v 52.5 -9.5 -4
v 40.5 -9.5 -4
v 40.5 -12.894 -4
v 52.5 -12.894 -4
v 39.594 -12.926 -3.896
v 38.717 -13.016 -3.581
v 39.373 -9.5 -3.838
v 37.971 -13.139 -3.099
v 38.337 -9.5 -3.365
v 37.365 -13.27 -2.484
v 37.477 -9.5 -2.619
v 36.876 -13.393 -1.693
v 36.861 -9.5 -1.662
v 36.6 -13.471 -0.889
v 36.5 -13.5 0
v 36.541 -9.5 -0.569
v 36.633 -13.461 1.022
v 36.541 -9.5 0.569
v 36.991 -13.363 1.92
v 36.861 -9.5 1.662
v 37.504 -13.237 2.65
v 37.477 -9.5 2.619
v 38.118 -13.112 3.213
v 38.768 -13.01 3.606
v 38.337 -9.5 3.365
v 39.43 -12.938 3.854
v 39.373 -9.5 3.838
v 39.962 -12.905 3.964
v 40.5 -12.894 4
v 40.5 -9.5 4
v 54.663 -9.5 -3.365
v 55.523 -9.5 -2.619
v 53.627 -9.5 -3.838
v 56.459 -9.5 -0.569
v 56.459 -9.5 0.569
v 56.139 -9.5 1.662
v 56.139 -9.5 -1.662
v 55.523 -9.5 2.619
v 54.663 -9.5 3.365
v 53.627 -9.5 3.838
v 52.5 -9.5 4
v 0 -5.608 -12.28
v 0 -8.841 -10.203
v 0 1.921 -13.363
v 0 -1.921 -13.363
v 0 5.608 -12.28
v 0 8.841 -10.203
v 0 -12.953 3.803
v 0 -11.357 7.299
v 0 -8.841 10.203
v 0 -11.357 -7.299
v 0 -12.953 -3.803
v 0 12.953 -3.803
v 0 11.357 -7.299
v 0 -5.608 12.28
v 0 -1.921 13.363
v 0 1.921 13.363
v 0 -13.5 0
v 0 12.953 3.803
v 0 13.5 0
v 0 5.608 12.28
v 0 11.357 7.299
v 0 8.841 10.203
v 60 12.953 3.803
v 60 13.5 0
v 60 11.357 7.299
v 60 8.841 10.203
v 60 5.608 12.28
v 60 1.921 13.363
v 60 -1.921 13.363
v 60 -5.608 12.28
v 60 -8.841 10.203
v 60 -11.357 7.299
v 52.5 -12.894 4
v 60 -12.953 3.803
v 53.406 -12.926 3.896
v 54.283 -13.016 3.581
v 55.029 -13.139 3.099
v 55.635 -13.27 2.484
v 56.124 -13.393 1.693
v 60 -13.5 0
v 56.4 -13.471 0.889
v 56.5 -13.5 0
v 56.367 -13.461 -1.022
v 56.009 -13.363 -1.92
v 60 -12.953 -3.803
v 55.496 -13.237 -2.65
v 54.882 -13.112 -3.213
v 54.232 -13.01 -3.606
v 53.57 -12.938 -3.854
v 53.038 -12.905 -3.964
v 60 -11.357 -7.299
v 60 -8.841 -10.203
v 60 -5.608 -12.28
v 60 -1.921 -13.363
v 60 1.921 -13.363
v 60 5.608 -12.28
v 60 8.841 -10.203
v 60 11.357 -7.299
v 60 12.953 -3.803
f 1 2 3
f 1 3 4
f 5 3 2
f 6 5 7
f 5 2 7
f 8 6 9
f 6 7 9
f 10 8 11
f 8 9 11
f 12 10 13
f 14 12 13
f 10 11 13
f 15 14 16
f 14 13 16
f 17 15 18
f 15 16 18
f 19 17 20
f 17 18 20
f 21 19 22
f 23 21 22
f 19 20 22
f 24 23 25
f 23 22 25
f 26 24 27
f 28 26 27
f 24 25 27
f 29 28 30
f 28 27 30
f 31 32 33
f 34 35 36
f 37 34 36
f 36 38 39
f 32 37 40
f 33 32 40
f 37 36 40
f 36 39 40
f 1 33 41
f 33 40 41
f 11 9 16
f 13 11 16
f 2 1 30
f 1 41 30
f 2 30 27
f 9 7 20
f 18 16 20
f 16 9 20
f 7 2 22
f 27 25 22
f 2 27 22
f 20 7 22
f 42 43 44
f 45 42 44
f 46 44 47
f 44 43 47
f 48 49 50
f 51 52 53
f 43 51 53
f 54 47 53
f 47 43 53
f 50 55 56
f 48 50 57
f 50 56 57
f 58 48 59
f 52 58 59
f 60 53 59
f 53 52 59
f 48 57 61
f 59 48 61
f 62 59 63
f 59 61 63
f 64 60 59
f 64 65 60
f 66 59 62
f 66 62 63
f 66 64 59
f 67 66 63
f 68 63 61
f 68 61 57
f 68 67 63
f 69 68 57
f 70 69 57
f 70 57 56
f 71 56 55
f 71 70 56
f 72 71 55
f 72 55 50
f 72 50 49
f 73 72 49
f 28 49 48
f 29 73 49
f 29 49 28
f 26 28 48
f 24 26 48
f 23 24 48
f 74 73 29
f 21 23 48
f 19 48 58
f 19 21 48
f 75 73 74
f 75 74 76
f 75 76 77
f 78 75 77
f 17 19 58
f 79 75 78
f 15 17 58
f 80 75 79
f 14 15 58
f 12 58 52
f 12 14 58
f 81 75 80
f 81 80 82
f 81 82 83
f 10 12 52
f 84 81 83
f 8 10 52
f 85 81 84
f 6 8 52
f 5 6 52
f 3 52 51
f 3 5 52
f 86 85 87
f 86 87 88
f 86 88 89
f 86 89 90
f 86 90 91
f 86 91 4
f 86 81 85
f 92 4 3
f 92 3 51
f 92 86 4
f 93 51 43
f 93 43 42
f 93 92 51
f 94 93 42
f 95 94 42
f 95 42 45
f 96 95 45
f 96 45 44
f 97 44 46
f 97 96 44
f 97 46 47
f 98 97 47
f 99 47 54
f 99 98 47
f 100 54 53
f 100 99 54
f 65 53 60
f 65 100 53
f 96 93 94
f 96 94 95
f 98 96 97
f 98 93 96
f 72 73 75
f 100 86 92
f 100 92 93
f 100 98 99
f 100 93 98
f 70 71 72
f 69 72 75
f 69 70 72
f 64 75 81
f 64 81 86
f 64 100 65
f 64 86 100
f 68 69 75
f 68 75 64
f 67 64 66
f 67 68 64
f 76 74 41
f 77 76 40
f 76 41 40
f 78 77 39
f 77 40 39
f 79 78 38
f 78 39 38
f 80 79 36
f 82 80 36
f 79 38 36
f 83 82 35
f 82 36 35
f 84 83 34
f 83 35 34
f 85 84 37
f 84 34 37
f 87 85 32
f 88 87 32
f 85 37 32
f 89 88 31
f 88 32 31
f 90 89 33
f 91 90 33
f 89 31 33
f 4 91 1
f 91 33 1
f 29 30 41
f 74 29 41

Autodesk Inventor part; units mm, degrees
ref_plane "YZ Plane" through (0, 0, 0) normal (1, 0, 0) x (0, 1, 0)
ref_plane "XY Plane" through (0, 0, 0) normal (0, 0, 1) x (1, 0, 0)
sketch "Sketch1" plane through (0, 0, 0) normal (0, 0, 1) x (1, 0, 0)
  line L0 (0, 0) -> (0, 13.5)
  line L1 (0, 13.5) -> (60, 13.5)
  line L2 (60, 13.5) -> (60, 0)
  line L3 (60, 0) -> (0, 0)
  line L4 (0, 0) -> (64.8862, 0) construction
  dimension "d0" = 13.5
  dimension "d1" = 60
revolve "Revolution3" add sketch "Sketch1" angle 360 about axis through (0, 0, 0) along (1, 0, 0)
ref_plane "Work Plane3" through (0, -9.5, 0) normal (0, 1, 0) x (-1, 0, 0)
sketch "Sketch5" plane through (0, -9.5, 0) normal (0, 1, 0) x (-1, 0, 0)
  line L0 (0, 0) -> (-33, 0) construction
  line L1 (-33, 0) -> (-36.5, 0) construction
  line L2 (-36.5, 0) -> (-56.5, 0) construction
  line L3 (-46.5, 0) -> (-40.5, 0)
  line L4 (-40.5, 0) -> (-52.5, 0)
  arc A0 (-40.5, -4) -> (-40.5, 4) centre (-40.5, 0) ccw
  arc A1 (-52.5, 4) -> (-52.5, -4) centre (-52.5, 0) ccw
  line L5 (-40.5, -4) -> (-52.5, -4)
  line L6 (-40.5, 4) -> (-52.5, 4)
  dimension "d39" = 33
  dimension "d40" = 3.5
  dimension "d41" = 20
  dimension "d42" = 6
  dimension "d43" = 12
  dimension "d44" = 8
  dimension "d45" = 8
sketch "Sketch6" plane through (0, 0, 0) normal (-1, 0, 0) x (0, 0, 1)
  circle A0 centre (0, 0) radius 13.5 projected
  line L0 (0, 13.5) -> (0, -9.5)
  line L1 (0, -9.5) -> (9.5917, -9.5)
  line L2 (0, -9.5) -> (-9.5917, -9.5)
  dimension "d46" = 23
extrude "Extrusion1" cut sketch "Sketch5" against normal blind 4
thread "Thread1" size "M27x3" class "6g" standard "ANSI Metric M Profile" length 33
sketch "Sketch7" plane through (52.5, -9.5, 4) normal (0, 0, -1) x (-1, 0, 0)
  point P0 (52.5, 9.5)
properties part number "Cilindro Inicial con Corte" material "Aluminum 6061"
